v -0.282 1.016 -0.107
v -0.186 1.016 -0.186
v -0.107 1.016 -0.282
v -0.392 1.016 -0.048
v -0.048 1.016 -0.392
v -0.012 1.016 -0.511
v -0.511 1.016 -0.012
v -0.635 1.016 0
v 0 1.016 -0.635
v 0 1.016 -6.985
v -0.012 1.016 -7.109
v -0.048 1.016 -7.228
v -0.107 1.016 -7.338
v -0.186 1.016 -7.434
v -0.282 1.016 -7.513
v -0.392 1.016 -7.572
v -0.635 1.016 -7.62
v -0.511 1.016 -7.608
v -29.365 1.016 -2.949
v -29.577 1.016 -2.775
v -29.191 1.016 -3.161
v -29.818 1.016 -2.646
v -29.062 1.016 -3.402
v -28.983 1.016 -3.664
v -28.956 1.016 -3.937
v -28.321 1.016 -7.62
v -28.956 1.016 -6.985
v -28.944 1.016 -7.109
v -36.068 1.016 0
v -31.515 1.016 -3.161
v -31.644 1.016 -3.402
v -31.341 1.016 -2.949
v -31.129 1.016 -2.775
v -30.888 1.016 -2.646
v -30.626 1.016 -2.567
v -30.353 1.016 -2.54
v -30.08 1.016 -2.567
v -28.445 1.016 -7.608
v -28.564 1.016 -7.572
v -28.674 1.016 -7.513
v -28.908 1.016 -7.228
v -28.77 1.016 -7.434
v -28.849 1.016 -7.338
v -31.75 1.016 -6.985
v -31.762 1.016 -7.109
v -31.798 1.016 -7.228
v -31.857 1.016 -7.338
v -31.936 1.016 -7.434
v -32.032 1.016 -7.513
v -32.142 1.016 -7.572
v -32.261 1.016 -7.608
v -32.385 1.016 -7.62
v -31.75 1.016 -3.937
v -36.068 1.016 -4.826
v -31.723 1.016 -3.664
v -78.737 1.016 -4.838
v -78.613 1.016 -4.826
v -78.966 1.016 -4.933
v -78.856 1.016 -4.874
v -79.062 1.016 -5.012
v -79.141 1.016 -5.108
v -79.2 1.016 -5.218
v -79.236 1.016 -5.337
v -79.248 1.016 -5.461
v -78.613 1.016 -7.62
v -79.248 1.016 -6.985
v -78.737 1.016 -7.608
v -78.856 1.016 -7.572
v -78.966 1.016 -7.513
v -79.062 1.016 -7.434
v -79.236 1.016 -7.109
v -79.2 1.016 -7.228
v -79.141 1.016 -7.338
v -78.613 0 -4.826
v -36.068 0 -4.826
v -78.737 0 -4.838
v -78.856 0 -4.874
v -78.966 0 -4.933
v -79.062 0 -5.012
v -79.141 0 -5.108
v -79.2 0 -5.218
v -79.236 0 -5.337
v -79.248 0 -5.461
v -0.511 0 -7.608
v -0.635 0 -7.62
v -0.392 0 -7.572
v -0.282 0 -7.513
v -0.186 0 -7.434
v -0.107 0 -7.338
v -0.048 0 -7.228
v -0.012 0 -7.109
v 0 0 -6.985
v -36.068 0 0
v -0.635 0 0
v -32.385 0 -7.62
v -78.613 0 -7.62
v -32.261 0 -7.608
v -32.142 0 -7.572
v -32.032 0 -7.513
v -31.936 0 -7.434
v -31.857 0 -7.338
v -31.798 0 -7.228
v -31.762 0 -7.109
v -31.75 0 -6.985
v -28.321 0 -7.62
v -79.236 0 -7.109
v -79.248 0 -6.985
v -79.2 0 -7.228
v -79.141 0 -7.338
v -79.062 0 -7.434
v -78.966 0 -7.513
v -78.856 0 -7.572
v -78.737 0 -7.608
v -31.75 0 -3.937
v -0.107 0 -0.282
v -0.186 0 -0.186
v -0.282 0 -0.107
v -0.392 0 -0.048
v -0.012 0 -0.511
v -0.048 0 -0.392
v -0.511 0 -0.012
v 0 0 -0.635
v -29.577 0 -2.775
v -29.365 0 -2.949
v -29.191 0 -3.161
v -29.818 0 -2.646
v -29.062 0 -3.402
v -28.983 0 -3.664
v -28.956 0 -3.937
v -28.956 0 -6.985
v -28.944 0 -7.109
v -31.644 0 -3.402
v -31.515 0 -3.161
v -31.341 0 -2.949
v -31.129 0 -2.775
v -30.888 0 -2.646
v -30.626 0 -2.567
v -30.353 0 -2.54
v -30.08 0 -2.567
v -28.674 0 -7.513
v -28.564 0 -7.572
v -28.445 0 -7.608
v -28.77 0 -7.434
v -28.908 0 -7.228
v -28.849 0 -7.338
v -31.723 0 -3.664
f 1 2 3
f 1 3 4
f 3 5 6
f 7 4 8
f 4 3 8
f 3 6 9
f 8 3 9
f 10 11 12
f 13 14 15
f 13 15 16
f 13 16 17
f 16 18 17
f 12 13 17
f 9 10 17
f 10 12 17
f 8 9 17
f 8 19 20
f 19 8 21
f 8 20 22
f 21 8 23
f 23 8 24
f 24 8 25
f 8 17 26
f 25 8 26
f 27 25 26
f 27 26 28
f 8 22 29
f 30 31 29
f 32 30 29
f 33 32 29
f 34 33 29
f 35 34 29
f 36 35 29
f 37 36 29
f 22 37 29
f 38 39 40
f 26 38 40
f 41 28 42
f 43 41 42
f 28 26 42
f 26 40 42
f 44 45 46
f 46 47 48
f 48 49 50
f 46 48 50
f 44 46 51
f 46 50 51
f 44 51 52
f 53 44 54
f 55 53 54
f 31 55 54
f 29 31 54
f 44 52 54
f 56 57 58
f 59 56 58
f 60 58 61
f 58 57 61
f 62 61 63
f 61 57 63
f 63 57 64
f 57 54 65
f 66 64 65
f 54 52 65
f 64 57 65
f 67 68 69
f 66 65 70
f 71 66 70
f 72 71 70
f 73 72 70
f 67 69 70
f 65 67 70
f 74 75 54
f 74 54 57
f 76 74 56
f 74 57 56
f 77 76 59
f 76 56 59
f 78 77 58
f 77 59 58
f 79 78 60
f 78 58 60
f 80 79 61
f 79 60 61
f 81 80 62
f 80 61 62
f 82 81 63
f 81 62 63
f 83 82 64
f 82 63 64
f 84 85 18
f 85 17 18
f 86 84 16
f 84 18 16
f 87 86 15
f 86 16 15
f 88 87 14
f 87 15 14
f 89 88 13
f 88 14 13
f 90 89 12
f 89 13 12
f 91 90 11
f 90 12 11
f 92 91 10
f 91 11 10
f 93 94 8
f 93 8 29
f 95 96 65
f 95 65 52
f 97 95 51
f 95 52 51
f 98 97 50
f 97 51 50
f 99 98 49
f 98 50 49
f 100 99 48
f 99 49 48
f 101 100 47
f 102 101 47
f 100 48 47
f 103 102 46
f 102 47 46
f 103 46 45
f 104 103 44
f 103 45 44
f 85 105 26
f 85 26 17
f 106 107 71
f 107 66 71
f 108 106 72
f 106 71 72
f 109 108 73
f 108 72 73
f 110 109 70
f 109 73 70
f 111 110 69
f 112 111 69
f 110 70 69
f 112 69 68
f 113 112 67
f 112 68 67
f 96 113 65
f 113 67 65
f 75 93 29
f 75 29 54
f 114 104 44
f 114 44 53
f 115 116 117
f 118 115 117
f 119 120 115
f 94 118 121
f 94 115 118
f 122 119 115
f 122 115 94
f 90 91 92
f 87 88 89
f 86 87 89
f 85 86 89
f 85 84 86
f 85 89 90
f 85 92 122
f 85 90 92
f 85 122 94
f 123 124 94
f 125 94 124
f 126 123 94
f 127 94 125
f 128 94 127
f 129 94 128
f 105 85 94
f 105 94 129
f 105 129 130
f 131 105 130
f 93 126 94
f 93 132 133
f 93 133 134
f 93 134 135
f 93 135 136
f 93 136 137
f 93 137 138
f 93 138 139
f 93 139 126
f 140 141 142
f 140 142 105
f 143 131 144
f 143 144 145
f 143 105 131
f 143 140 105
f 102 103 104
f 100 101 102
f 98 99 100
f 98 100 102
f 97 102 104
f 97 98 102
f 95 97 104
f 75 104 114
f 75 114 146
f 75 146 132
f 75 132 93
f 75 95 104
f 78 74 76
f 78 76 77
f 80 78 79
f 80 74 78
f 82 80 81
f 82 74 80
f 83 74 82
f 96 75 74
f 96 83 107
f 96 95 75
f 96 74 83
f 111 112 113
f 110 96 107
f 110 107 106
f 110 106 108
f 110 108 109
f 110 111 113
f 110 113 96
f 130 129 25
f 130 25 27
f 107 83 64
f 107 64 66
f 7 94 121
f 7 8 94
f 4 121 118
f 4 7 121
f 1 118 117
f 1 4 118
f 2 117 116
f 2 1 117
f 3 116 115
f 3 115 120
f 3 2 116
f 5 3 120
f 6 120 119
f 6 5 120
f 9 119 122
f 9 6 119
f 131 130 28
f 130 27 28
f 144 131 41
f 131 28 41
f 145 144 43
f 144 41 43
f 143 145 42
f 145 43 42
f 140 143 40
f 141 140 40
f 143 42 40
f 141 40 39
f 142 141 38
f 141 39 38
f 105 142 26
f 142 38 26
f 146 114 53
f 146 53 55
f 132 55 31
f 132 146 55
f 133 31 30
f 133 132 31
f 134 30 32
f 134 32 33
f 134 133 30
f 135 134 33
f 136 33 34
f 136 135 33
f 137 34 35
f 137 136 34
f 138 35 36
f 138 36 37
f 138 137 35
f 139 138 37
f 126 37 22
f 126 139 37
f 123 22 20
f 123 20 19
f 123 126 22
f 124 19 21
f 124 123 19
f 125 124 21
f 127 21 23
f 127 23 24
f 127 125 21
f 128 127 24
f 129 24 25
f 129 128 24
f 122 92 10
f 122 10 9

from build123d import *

# Parameters (mm, degrees)
BOSS_EXTRUDE1_DEPTH = 1.016
FILLET1_R           = 0.635


with BuildPart() as part:
    # Sketch1 → Boss-Extrude1 (new body)
    with BuildSketch(Plane(origin=(0, 0, 0), x_dir=(1, 0, 0), z_dir=(0, 1, 0))):
        with BuildLine():
            Line((0, 0), (-36.068, 0))
            Line((-36.068, 0), (-36.068, 4.826))
            Line((-36.068, 4.826), (-79.248, 4.826))
            Line((-79.248, 4.826), (-79.248, 7.62))
            Line((-79.248, 7.62), (-31.75, 7.62))
            Line((-31.75, 7.62), (-31.75, 3.937))
            ThreePointArc((-31.75, 3.937), (-30.353, 2.54), (-28.956, 3.937))
            Line((-28.956, 3.937), (-28.956, 7.62))
            Line((-28.956, 7.62), (0, 7.62))
            Line((0, 7.62), (0, 0))
        make_face()
    extrude(amount=BOSS_EXTRUDE1_DEPTH)

    # Fillet1
    fillet1_edges = [part.edges().sort_by_distance(p)[0] for p in [
        (0, 0.508, 0),
        (-79.248, 0.508, -4.826),
        (-79.248, 0.508, -7.62),
        (-31.75, 0.508, -7.62),
        (-28.956, 0.508, -7.62),
        (0, 0.508, -7.62),
    ]]
    fillet(fillet1_edges, radius=FILLET1_R)


solid = part.part
